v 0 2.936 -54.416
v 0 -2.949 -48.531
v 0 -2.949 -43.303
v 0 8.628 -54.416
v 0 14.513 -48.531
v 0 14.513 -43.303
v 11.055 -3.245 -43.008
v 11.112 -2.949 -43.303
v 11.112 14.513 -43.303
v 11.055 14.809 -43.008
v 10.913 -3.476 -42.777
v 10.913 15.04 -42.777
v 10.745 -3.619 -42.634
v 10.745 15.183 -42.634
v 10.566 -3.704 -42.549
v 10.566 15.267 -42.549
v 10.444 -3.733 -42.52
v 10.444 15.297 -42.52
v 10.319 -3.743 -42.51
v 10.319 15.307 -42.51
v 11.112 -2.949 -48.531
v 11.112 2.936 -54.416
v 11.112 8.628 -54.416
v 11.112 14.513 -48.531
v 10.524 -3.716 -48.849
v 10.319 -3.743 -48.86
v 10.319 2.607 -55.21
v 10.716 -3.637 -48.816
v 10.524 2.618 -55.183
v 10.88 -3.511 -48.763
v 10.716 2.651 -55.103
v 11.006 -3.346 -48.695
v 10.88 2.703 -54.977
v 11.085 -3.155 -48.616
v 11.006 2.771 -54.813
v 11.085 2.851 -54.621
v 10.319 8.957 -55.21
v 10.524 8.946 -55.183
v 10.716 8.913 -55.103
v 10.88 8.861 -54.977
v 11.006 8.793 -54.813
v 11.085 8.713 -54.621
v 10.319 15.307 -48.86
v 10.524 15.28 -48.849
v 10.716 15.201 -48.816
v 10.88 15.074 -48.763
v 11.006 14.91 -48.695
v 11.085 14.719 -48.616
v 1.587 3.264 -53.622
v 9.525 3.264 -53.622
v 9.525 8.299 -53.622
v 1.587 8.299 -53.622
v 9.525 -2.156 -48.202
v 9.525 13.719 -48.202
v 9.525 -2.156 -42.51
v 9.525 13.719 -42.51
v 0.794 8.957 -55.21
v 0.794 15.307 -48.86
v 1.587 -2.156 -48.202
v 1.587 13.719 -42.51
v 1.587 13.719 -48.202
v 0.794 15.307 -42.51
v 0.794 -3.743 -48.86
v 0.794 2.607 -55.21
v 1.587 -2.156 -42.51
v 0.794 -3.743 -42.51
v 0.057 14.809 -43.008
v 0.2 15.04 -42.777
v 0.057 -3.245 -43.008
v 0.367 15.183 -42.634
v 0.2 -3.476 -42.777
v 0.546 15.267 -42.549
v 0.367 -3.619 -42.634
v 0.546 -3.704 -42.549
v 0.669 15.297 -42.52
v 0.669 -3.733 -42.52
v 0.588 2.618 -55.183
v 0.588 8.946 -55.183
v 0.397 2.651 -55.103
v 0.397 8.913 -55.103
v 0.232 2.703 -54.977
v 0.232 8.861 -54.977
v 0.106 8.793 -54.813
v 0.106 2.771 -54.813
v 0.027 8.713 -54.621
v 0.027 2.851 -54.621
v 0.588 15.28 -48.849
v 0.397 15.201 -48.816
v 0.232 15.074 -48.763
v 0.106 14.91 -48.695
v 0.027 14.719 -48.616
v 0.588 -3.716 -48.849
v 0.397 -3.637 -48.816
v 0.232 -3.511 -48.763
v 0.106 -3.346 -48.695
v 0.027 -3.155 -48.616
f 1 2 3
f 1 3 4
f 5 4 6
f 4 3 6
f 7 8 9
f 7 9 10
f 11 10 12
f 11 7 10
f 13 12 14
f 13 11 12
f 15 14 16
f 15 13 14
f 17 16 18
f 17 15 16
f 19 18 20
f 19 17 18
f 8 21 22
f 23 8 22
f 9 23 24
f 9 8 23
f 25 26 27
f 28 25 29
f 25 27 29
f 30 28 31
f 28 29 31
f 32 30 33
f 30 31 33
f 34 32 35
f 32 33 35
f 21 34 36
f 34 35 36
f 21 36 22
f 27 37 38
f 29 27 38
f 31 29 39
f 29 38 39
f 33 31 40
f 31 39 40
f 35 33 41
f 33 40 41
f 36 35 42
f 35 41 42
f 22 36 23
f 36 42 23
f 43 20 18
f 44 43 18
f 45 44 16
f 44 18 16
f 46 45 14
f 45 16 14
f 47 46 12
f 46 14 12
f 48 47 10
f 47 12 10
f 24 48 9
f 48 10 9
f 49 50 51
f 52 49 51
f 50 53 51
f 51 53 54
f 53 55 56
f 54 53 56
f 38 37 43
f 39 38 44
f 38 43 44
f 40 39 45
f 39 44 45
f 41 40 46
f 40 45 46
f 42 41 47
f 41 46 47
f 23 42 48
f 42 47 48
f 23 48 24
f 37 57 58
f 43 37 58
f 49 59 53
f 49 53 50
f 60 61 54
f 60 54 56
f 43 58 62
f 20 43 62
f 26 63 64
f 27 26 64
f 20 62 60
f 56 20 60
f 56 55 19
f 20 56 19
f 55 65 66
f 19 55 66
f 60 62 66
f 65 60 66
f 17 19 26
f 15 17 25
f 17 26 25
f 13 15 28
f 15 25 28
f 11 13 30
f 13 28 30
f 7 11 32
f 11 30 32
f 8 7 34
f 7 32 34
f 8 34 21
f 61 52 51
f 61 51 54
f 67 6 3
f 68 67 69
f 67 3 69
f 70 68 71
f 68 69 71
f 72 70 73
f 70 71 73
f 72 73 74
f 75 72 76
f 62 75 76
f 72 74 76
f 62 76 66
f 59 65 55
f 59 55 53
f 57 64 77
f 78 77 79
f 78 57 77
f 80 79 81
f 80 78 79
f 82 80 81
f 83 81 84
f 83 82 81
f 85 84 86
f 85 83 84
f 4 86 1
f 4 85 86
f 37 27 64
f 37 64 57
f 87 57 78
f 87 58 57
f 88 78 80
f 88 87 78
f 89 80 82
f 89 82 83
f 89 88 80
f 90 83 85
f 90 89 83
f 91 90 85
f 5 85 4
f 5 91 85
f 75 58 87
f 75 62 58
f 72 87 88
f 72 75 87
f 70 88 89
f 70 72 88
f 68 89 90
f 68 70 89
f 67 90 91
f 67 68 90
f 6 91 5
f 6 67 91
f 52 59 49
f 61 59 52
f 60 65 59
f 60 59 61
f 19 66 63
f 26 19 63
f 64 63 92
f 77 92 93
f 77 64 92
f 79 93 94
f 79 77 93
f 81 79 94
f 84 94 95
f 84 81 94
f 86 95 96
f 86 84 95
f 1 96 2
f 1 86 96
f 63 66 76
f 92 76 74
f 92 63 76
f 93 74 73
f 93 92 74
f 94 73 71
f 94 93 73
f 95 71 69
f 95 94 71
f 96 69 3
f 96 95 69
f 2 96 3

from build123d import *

# Parameters (mm, degrees)
F1_DEPTH = 11.1125
F2_T     = -1.5875
F3_R     = 0.79375


with BuildPart() as f1:
    # F0 (on Right) → F1 (new body)
    with BuildSketch(Plane.YZ):
        Polygon((15.306922, -42.509722), (-3.743078, -42.509722), (-3.743078, -48.859722), (2.606922, -55.209722), (8.956922, -55.209722), (15.306922, -48.859722), align=None)
    extrude(amount=F1_DEPTH)

    # F2
    f2_openings = [f1.faces().sort_by_distance(p)[0] for p in [
        (5.55625, 5.781922, -42.509722),
    ]]
    offset(amount=F2_T, openings=f2_openings)

    # F3
    f3_edges = [f1.edges().sort_by_distance(p)[0] for p in [
        (11.1125, 5.781922, -42.509722),
        (11.1125, -3.743078, -45.684722),
        (11.1125, -0.568078, -52.034722),
        (11.1125, 5.781922, -55.209722),
        (11.1125, 12.131922, -52.034722),
        (11.1125, 15.306922, -45.684722),
        (0, 5.781922, -42.509722),
        (0, -3.743078, -45.684722),
        (0, -0.568078, -52.034722),
        (0, 5.781922, -55.209722),
        (0, 12.131922, -52.034722),
        (0, 15.306922, -45.684722),
    ]]
    fillet(f3_edges, radius=F3_R)


solid = f1.part
